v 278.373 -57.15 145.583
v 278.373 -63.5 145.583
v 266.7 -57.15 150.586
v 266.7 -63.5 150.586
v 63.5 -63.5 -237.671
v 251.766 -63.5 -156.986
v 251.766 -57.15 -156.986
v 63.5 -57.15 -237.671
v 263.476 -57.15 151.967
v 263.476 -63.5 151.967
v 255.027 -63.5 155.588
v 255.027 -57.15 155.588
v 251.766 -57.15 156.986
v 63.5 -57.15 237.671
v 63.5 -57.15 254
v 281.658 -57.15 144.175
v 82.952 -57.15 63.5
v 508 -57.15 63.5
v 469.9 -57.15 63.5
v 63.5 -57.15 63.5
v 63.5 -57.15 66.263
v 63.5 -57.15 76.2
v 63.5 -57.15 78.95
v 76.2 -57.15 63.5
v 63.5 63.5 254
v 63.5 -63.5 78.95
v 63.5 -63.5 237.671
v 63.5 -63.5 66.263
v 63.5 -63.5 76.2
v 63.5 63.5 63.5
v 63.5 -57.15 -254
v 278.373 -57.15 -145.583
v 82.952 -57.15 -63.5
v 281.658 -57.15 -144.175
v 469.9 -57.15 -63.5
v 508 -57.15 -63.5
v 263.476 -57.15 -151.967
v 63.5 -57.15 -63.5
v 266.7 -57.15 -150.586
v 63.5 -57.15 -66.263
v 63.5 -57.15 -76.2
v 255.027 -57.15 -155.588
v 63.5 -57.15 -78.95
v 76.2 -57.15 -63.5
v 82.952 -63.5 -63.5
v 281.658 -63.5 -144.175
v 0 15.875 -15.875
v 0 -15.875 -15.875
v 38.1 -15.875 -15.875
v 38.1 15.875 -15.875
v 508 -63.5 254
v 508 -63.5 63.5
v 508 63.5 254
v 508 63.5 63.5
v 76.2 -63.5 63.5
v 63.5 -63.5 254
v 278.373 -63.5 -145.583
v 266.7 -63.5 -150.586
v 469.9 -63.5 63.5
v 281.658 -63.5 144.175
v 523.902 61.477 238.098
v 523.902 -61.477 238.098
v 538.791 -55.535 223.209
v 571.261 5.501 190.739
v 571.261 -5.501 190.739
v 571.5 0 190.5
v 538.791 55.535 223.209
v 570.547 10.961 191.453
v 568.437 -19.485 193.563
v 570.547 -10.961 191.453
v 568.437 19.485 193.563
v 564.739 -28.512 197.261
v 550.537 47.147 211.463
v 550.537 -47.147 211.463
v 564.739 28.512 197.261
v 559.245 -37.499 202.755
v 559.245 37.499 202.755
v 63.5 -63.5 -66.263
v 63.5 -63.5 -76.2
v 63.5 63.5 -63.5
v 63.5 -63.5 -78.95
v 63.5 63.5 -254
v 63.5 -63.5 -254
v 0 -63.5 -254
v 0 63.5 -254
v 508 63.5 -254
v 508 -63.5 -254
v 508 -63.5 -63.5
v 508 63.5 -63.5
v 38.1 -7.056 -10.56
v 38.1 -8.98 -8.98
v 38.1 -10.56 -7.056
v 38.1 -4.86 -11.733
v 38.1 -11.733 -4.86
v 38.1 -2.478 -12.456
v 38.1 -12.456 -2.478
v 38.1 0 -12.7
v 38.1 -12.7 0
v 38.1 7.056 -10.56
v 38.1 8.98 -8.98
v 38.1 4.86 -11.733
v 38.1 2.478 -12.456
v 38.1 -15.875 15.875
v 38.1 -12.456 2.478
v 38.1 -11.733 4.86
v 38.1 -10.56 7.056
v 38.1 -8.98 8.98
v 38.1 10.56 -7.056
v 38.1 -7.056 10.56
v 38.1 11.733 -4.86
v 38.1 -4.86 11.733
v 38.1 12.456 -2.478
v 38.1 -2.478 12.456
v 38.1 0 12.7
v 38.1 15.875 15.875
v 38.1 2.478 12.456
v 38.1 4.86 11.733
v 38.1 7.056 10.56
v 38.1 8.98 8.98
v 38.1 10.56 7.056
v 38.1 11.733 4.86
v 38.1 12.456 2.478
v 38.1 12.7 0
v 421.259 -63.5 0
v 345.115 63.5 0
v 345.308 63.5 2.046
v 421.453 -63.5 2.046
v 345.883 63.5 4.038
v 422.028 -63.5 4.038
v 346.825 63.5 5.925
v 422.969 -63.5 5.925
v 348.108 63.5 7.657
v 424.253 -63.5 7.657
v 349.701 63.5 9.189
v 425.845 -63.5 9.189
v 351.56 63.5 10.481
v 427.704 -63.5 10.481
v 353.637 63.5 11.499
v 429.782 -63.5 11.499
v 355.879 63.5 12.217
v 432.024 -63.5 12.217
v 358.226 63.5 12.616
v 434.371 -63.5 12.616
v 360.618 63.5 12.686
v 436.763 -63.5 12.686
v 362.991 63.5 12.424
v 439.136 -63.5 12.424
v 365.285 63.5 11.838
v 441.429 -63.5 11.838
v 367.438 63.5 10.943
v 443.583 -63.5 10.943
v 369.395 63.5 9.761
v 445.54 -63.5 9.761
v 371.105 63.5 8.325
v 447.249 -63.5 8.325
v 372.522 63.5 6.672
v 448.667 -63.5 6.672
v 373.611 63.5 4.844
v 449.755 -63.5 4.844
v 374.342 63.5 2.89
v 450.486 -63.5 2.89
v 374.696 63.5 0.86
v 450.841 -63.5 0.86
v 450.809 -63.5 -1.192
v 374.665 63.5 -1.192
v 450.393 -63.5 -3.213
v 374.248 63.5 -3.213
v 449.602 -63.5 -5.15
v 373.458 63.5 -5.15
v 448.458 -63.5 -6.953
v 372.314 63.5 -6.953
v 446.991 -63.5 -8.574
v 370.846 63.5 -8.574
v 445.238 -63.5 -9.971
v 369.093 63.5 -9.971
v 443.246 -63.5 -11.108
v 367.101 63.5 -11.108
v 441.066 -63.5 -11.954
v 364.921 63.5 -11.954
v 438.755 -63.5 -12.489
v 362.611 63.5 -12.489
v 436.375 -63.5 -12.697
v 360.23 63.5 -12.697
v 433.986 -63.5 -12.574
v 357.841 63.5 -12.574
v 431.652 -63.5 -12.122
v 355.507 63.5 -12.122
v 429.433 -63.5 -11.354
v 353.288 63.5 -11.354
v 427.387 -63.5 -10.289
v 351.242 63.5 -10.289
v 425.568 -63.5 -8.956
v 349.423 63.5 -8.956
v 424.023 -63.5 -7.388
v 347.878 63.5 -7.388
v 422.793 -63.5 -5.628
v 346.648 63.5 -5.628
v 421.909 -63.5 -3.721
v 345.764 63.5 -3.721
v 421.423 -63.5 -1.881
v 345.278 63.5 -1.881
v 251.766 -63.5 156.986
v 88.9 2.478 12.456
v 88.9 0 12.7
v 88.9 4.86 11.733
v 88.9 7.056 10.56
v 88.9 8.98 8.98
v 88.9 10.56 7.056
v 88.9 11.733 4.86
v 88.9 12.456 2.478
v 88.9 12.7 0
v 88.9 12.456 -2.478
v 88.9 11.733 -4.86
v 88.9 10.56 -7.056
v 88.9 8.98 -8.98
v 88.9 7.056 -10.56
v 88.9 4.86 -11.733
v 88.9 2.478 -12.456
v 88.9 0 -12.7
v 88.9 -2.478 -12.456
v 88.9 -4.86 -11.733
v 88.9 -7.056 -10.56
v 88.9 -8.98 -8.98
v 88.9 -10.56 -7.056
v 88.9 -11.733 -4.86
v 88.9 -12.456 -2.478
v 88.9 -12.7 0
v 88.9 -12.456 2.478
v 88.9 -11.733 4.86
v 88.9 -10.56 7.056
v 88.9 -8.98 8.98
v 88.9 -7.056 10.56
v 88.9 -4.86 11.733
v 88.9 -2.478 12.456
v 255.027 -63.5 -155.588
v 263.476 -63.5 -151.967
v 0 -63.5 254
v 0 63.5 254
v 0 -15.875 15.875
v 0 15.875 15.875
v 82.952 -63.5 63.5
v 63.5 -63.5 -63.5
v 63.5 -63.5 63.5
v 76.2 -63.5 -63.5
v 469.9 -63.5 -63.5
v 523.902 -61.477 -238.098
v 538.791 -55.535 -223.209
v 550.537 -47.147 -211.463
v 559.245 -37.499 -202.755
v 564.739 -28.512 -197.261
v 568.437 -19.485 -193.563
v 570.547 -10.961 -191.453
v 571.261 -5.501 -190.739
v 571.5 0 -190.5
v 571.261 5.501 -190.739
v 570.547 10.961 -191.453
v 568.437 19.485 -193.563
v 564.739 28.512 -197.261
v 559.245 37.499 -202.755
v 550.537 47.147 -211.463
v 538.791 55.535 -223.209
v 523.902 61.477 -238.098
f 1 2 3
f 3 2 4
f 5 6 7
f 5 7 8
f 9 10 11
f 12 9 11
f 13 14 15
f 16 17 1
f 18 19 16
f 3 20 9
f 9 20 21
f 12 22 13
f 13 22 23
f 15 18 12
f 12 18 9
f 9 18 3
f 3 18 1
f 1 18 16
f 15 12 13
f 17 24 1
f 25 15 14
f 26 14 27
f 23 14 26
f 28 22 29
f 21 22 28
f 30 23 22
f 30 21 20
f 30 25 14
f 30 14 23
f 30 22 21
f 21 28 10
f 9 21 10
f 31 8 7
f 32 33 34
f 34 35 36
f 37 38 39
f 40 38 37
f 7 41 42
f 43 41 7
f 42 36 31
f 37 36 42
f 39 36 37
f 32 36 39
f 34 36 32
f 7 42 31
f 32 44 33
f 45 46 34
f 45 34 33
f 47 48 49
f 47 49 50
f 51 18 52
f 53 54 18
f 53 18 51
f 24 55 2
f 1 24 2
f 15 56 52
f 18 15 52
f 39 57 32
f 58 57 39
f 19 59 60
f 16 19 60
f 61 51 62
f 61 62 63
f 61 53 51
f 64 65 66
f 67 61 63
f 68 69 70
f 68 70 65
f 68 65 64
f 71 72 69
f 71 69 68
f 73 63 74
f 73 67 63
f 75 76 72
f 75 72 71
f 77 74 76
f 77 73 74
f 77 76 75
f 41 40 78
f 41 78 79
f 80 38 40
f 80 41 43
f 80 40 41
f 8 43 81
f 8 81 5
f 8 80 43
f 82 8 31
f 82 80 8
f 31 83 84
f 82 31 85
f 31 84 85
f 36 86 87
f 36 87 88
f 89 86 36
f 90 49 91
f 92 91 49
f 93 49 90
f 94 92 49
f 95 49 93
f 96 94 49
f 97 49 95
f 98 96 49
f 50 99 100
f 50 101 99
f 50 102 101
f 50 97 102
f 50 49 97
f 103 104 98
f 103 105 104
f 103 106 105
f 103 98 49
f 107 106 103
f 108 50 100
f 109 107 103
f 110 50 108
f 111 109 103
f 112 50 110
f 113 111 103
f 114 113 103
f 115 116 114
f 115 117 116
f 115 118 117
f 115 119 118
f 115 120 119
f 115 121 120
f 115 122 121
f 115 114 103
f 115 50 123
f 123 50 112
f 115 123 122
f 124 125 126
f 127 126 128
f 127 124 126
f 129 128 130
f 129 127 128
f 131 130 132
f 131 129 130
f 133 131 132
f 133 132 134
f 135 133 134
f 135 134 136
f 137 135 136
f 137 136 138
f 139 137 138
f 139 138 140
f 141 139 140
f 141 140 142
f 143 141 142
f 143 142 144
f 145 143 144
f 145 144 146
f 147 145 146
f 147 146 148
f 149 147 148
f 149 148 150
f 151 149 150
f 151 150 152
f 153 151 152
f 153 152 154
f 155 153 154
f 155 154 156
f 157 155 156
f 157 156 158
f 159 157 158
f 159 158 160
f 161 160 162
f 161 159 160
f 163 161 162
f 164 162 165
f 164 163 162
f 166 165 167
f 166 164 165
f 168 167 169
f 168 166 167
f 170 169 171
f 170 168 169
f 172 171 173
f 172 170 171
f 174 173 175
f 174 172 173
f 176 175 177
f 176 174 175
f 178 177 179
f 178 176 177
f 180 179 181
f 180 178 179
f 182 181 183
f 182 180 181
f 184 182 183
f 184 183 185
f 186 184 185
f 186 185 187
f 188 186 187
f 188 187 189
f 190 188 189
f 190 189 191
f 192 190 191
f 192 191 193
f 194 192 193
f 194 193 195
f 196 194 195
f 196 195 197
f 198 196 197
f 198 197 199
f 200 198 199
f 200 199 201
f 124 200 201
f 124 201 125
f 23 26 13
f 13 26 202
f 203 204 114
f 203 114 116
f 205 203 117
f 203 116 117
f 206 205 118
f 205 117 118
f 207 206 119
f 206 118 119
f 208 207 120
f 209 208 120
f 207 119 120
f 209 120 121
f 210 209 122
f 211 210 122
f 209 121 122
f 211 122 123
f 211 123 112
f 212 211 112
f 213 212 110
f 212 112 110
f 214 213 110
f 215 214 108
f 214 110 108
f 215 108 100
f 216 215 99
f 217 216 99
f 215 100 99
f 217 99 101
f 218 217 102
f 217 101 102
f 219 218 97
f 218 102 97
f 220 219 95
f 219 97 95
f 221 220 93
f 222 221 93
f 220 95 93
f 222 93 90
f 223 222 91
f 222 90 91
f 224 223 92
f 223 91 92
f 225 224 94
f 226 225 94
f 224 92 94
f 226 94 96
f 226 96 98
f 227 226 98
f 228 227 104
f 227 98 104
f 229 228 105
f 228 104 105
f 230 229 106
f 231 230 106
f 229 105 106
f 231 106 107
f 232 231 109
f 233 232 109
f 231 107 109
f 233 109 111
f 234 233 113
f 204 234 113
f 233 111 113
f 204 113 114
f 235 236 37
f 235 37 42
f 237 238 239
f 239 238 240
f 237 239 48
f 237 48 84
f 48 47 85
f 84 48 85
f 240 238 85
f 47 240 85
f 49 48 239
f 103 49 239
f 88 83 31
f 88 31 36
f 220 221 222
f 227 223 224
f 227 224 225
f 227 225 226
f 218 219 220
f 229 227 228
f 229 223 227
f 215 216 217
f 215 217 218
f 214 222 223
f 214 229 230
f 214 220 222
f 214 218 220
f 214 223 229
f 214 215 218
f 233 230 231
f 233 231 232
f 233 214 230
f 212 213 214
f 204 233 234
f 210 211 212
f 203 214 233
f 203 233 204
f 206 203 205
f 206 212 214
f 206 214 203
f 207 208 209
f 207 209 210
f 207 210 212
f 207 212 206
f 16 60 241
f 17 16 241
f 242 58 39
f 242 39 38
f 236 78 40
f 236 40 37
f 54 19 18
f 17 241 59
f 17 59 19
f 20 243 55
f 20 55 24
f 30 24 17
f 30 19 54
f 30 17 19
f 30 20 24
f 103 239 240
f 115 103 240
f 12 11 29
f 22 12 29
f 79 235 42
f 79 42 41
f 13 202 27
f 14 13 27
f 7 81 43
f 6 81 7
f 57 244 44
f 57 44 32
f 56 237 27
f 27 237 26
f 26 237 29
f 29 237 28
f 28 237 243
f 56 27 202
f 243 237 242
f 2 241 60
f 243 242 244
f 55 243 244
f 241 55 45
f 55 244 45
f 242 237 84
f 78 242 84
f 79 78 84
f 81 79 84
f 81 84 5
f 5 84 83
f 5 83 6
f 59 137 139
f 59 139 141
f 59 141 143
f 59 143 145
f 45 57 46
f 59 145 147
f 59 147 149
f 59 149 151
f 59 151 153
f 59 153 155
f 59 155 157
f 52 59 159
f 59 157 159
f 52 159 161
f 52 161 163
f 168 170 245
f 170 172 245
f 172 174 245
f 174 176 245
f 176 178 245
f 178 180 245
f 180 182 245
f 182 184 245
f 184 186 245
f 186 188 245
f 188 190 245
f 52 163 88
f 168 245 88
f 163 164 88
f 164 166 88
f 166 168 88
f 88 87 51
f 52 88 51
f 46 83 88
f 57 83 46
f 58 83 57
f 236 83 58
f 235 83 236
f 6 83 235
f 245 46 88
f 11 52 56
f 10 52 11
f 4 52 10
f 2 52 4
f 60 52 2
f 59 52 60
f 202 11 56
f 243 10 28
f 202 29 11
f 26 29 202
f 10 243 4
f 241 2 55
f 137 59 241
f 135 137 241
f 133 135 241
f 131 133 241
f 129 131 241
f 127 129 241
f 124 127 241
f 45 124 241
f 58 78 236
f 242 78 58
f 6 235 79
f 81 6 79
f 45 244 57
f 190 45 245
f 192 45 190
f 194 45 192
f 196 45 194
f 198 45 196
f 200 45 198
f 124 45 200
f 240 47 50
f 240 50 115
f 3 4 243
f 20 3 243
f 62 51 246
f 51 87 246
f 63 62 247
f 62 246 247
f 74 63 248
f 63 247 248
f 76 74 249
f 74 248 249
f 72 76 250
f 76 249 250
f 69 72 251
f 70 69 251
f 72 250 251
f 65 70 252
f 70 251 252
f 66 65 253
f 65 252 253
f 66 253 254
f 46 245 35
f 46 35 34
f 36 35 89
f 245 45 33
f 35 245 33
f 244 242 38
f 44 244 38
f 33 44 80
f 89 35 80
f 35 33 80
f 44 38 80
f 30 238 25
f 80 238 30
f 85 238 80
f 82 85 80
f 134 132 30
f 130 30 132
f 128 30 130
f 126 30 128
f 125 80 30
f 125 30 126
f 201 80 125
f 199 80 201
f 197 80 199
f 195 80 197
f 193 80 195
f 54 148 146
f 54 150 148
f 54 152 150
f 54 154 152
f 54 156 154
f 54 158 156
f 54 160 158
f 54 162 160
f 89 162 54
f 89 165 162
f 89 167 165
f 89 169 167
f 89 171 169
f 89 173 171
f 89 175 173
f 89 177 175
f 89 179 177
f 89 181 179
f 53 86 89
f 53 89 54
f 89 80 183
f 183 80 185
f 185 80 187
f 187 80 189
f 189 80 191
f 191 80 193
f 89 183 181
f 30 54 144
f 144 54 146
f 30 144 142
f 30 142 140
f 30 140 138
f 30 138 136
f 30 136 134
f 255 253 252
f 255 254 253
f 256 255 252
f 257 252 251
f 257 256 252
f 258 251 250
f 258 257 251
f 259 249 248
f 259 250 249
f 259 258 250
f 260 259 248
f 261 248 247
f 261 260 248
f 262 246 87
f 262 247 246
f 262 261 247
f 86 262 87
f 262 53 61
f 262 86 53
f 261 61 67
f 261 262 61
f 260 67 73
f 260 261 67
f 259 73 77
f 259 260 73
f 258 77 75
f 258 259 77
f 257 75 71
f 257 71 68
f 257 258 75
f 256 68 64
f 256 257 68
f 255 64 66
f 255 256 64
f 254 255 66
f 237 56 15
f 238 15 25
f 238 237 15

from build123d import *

# Parameters (mm, degrees)
SKETCH2_W               = 508
SKETCH2_H               = 127
BOSS_EXTRUDE1_DEPTH     = 63.5
SKETCH3_W               = 127
SKETCH3_H               = 127
BOSS_EXTRUDE2_DEPTH     = 444.5
SKETCH4_W               = 31.75
SKETCH4_H               = 31.75
CUT_EXTRUDE1_DEPTH      = 38.1
SKETCH5_R               = 12.7
CUT_EXTRUDE2_DEPTH      = 50.8
BOSS_EXTRUDE3_DEPTH     = 6.35
EXTRUDE_THIN1_START     = -6.35
EXTRUDE_THIN1_DEPTH     = 6.35
BOSS_EXTRUDE4_DEPTH     = 127
FILLET1_R               = 63.5
CUT_EXTRUDE3_DEPTH      = 583.156936495
CUT_EXTRUDE3_DEPTH_BACK = 583.156936495
SKETCH13_R              = 12.7


# Read off the part's stored shape, not the designer's step: Extrude-Thin1
with BuildPart() as part:
    # Sketch2 → Boss-Extrude1 (new body)
    with BuildSketch(Plane(origin=(0, 0, 0), x_dir=(0, 0, -1), z_dir=(1, 0, 0))):
        Rectangle(SKETCH2_W, SKETCH2_H)
    extrude(amount=BOSS_EXTRUDE1_DEPTH)

    # Sketch3 → Boss-Extrude2 (add)
    with BuildSketch(Plane(origin=(63.5, 0, 0), x_dir=(0, 0, -1), z_dir=(1, 0, 0))):
        Rectangle(SKETCH3_W, SKETCH3_H)
    extrude(amount=BOSS_EXTRUDE2_DEPTH)

    # Sketch4 → Cut-Extrude1 (cut)
    with BuildSketch(Plane.ZY):
        Rectangle(SKETCH4_W, SKETCH4_H)
    extrude(amount=-CUT_EXTRUDE1_DEPTH, mode=Mode.SUBTRACT)

    # Sketch5 → Cut-Extrude2 (cut)
    with BuildSketch(Plane.ZY.offset(-38.1)):
        Circle(SKETCH5_R)
    extrude(amount=-CUT_EXTRUDE2_DEPTH, mode=Mode.SUBTRACT)

    # Sketch10 → Boss-Extrude3 (add)
    with BuildSketch(Plane.XZ.offset(63.5)):
        Polygon((63.5, 254), (508, 63.5), (469.9, 63.5), (63.5, 237.671428571), align=None)
    boss_extrude3 = extrude(amount=-BOSS_EXTRUDE3_DEPTH)

    # Mirror1: Boss-Extrude3 across plane
    add(boss_extrude3.mirror(Plane.XY))

    # Extrude-Thin1 outline → Extrude-Thin1 (add)
    with BuildSketch(Plane(origin=(0, -57.15, 0), x_dir=(1, 0, 0), z_dir=(0, 1, 0)).offset(EXTRUDE_THIN1_START)):
        Polygon((82.952073355, -63.5), (76.2, -63.5), (278.373141881, -145.582939194), (281.657885075, -144.175192111), align=None)
        Polygon((266.7, -150.585714286), (63.5, -63.5), (63.5, -66.26343767), (263.475989385, -151.967433121), align=None)
        Polygon((255.026858119, -155.588489378), (63.5, -76.2), (63.5, -78.949557774), (251.765512342, -156.986208996), align=None)
    extrude_thin1 = extrude(amount=EXTRUDE_THIN1_DEPTH)

    # Mirror2: Extrude-Thin1 across plane
    add(extrude_thin1.mirror(Plane.XY))

    # Sketch12 → Boss-Extrude4 (add)
    with BuildSketch(Plane(origin=(0, 63.5, 0), x_dir=(1, 0, 0), z_dir=(0, 1, 0))):
        Polygon((508, 254), (508, 63.5), (571.5, 63.5), (571.5, 190.5), align=None)
        Polygon((571.5, 63.5), (508, 63.5), (508, -63.5), (508, -254), (571.5, -190.5), align=None)
    extrude(amount=-BOSS_EXTRUDE4_DEPTH)

    # Fillet1
    fillet1_edges = [part.edges().sort_by_distance(p)[0] for p in [
        (571.5, -63.5, 0),
        (571.5, 63.5, 0),
    ]]
    fillet(fillet1_edges, radius=FILLET1_R - 0.0001)  # a hair under: the kernel refuses the full size

    # Sketch13 → Cut-Extrude3 (cut, two sides: drawn at the far end of the back side and taken through both)
    with BuildSketch(Plane(origin=(106.321850008, -177.331865581, 0), x_dir=(0, 0, -1), z_dir=(-0.5142209424211187, 0.857657753638091, 0)).offset(-CUT_EXTRUDE3_DEPTH_BACK)):
        with Locations(Location((0, -341.343168692, 0), (0, 0, 90))):
            Circle(SKETCH13_R)
    extrude(amount=CUT_EXTRUDE3_DEPTH + CUT_EXTRUDE3_DEPTH_BACK, mode=Mode.SUBTRACT)


solid = part.part
